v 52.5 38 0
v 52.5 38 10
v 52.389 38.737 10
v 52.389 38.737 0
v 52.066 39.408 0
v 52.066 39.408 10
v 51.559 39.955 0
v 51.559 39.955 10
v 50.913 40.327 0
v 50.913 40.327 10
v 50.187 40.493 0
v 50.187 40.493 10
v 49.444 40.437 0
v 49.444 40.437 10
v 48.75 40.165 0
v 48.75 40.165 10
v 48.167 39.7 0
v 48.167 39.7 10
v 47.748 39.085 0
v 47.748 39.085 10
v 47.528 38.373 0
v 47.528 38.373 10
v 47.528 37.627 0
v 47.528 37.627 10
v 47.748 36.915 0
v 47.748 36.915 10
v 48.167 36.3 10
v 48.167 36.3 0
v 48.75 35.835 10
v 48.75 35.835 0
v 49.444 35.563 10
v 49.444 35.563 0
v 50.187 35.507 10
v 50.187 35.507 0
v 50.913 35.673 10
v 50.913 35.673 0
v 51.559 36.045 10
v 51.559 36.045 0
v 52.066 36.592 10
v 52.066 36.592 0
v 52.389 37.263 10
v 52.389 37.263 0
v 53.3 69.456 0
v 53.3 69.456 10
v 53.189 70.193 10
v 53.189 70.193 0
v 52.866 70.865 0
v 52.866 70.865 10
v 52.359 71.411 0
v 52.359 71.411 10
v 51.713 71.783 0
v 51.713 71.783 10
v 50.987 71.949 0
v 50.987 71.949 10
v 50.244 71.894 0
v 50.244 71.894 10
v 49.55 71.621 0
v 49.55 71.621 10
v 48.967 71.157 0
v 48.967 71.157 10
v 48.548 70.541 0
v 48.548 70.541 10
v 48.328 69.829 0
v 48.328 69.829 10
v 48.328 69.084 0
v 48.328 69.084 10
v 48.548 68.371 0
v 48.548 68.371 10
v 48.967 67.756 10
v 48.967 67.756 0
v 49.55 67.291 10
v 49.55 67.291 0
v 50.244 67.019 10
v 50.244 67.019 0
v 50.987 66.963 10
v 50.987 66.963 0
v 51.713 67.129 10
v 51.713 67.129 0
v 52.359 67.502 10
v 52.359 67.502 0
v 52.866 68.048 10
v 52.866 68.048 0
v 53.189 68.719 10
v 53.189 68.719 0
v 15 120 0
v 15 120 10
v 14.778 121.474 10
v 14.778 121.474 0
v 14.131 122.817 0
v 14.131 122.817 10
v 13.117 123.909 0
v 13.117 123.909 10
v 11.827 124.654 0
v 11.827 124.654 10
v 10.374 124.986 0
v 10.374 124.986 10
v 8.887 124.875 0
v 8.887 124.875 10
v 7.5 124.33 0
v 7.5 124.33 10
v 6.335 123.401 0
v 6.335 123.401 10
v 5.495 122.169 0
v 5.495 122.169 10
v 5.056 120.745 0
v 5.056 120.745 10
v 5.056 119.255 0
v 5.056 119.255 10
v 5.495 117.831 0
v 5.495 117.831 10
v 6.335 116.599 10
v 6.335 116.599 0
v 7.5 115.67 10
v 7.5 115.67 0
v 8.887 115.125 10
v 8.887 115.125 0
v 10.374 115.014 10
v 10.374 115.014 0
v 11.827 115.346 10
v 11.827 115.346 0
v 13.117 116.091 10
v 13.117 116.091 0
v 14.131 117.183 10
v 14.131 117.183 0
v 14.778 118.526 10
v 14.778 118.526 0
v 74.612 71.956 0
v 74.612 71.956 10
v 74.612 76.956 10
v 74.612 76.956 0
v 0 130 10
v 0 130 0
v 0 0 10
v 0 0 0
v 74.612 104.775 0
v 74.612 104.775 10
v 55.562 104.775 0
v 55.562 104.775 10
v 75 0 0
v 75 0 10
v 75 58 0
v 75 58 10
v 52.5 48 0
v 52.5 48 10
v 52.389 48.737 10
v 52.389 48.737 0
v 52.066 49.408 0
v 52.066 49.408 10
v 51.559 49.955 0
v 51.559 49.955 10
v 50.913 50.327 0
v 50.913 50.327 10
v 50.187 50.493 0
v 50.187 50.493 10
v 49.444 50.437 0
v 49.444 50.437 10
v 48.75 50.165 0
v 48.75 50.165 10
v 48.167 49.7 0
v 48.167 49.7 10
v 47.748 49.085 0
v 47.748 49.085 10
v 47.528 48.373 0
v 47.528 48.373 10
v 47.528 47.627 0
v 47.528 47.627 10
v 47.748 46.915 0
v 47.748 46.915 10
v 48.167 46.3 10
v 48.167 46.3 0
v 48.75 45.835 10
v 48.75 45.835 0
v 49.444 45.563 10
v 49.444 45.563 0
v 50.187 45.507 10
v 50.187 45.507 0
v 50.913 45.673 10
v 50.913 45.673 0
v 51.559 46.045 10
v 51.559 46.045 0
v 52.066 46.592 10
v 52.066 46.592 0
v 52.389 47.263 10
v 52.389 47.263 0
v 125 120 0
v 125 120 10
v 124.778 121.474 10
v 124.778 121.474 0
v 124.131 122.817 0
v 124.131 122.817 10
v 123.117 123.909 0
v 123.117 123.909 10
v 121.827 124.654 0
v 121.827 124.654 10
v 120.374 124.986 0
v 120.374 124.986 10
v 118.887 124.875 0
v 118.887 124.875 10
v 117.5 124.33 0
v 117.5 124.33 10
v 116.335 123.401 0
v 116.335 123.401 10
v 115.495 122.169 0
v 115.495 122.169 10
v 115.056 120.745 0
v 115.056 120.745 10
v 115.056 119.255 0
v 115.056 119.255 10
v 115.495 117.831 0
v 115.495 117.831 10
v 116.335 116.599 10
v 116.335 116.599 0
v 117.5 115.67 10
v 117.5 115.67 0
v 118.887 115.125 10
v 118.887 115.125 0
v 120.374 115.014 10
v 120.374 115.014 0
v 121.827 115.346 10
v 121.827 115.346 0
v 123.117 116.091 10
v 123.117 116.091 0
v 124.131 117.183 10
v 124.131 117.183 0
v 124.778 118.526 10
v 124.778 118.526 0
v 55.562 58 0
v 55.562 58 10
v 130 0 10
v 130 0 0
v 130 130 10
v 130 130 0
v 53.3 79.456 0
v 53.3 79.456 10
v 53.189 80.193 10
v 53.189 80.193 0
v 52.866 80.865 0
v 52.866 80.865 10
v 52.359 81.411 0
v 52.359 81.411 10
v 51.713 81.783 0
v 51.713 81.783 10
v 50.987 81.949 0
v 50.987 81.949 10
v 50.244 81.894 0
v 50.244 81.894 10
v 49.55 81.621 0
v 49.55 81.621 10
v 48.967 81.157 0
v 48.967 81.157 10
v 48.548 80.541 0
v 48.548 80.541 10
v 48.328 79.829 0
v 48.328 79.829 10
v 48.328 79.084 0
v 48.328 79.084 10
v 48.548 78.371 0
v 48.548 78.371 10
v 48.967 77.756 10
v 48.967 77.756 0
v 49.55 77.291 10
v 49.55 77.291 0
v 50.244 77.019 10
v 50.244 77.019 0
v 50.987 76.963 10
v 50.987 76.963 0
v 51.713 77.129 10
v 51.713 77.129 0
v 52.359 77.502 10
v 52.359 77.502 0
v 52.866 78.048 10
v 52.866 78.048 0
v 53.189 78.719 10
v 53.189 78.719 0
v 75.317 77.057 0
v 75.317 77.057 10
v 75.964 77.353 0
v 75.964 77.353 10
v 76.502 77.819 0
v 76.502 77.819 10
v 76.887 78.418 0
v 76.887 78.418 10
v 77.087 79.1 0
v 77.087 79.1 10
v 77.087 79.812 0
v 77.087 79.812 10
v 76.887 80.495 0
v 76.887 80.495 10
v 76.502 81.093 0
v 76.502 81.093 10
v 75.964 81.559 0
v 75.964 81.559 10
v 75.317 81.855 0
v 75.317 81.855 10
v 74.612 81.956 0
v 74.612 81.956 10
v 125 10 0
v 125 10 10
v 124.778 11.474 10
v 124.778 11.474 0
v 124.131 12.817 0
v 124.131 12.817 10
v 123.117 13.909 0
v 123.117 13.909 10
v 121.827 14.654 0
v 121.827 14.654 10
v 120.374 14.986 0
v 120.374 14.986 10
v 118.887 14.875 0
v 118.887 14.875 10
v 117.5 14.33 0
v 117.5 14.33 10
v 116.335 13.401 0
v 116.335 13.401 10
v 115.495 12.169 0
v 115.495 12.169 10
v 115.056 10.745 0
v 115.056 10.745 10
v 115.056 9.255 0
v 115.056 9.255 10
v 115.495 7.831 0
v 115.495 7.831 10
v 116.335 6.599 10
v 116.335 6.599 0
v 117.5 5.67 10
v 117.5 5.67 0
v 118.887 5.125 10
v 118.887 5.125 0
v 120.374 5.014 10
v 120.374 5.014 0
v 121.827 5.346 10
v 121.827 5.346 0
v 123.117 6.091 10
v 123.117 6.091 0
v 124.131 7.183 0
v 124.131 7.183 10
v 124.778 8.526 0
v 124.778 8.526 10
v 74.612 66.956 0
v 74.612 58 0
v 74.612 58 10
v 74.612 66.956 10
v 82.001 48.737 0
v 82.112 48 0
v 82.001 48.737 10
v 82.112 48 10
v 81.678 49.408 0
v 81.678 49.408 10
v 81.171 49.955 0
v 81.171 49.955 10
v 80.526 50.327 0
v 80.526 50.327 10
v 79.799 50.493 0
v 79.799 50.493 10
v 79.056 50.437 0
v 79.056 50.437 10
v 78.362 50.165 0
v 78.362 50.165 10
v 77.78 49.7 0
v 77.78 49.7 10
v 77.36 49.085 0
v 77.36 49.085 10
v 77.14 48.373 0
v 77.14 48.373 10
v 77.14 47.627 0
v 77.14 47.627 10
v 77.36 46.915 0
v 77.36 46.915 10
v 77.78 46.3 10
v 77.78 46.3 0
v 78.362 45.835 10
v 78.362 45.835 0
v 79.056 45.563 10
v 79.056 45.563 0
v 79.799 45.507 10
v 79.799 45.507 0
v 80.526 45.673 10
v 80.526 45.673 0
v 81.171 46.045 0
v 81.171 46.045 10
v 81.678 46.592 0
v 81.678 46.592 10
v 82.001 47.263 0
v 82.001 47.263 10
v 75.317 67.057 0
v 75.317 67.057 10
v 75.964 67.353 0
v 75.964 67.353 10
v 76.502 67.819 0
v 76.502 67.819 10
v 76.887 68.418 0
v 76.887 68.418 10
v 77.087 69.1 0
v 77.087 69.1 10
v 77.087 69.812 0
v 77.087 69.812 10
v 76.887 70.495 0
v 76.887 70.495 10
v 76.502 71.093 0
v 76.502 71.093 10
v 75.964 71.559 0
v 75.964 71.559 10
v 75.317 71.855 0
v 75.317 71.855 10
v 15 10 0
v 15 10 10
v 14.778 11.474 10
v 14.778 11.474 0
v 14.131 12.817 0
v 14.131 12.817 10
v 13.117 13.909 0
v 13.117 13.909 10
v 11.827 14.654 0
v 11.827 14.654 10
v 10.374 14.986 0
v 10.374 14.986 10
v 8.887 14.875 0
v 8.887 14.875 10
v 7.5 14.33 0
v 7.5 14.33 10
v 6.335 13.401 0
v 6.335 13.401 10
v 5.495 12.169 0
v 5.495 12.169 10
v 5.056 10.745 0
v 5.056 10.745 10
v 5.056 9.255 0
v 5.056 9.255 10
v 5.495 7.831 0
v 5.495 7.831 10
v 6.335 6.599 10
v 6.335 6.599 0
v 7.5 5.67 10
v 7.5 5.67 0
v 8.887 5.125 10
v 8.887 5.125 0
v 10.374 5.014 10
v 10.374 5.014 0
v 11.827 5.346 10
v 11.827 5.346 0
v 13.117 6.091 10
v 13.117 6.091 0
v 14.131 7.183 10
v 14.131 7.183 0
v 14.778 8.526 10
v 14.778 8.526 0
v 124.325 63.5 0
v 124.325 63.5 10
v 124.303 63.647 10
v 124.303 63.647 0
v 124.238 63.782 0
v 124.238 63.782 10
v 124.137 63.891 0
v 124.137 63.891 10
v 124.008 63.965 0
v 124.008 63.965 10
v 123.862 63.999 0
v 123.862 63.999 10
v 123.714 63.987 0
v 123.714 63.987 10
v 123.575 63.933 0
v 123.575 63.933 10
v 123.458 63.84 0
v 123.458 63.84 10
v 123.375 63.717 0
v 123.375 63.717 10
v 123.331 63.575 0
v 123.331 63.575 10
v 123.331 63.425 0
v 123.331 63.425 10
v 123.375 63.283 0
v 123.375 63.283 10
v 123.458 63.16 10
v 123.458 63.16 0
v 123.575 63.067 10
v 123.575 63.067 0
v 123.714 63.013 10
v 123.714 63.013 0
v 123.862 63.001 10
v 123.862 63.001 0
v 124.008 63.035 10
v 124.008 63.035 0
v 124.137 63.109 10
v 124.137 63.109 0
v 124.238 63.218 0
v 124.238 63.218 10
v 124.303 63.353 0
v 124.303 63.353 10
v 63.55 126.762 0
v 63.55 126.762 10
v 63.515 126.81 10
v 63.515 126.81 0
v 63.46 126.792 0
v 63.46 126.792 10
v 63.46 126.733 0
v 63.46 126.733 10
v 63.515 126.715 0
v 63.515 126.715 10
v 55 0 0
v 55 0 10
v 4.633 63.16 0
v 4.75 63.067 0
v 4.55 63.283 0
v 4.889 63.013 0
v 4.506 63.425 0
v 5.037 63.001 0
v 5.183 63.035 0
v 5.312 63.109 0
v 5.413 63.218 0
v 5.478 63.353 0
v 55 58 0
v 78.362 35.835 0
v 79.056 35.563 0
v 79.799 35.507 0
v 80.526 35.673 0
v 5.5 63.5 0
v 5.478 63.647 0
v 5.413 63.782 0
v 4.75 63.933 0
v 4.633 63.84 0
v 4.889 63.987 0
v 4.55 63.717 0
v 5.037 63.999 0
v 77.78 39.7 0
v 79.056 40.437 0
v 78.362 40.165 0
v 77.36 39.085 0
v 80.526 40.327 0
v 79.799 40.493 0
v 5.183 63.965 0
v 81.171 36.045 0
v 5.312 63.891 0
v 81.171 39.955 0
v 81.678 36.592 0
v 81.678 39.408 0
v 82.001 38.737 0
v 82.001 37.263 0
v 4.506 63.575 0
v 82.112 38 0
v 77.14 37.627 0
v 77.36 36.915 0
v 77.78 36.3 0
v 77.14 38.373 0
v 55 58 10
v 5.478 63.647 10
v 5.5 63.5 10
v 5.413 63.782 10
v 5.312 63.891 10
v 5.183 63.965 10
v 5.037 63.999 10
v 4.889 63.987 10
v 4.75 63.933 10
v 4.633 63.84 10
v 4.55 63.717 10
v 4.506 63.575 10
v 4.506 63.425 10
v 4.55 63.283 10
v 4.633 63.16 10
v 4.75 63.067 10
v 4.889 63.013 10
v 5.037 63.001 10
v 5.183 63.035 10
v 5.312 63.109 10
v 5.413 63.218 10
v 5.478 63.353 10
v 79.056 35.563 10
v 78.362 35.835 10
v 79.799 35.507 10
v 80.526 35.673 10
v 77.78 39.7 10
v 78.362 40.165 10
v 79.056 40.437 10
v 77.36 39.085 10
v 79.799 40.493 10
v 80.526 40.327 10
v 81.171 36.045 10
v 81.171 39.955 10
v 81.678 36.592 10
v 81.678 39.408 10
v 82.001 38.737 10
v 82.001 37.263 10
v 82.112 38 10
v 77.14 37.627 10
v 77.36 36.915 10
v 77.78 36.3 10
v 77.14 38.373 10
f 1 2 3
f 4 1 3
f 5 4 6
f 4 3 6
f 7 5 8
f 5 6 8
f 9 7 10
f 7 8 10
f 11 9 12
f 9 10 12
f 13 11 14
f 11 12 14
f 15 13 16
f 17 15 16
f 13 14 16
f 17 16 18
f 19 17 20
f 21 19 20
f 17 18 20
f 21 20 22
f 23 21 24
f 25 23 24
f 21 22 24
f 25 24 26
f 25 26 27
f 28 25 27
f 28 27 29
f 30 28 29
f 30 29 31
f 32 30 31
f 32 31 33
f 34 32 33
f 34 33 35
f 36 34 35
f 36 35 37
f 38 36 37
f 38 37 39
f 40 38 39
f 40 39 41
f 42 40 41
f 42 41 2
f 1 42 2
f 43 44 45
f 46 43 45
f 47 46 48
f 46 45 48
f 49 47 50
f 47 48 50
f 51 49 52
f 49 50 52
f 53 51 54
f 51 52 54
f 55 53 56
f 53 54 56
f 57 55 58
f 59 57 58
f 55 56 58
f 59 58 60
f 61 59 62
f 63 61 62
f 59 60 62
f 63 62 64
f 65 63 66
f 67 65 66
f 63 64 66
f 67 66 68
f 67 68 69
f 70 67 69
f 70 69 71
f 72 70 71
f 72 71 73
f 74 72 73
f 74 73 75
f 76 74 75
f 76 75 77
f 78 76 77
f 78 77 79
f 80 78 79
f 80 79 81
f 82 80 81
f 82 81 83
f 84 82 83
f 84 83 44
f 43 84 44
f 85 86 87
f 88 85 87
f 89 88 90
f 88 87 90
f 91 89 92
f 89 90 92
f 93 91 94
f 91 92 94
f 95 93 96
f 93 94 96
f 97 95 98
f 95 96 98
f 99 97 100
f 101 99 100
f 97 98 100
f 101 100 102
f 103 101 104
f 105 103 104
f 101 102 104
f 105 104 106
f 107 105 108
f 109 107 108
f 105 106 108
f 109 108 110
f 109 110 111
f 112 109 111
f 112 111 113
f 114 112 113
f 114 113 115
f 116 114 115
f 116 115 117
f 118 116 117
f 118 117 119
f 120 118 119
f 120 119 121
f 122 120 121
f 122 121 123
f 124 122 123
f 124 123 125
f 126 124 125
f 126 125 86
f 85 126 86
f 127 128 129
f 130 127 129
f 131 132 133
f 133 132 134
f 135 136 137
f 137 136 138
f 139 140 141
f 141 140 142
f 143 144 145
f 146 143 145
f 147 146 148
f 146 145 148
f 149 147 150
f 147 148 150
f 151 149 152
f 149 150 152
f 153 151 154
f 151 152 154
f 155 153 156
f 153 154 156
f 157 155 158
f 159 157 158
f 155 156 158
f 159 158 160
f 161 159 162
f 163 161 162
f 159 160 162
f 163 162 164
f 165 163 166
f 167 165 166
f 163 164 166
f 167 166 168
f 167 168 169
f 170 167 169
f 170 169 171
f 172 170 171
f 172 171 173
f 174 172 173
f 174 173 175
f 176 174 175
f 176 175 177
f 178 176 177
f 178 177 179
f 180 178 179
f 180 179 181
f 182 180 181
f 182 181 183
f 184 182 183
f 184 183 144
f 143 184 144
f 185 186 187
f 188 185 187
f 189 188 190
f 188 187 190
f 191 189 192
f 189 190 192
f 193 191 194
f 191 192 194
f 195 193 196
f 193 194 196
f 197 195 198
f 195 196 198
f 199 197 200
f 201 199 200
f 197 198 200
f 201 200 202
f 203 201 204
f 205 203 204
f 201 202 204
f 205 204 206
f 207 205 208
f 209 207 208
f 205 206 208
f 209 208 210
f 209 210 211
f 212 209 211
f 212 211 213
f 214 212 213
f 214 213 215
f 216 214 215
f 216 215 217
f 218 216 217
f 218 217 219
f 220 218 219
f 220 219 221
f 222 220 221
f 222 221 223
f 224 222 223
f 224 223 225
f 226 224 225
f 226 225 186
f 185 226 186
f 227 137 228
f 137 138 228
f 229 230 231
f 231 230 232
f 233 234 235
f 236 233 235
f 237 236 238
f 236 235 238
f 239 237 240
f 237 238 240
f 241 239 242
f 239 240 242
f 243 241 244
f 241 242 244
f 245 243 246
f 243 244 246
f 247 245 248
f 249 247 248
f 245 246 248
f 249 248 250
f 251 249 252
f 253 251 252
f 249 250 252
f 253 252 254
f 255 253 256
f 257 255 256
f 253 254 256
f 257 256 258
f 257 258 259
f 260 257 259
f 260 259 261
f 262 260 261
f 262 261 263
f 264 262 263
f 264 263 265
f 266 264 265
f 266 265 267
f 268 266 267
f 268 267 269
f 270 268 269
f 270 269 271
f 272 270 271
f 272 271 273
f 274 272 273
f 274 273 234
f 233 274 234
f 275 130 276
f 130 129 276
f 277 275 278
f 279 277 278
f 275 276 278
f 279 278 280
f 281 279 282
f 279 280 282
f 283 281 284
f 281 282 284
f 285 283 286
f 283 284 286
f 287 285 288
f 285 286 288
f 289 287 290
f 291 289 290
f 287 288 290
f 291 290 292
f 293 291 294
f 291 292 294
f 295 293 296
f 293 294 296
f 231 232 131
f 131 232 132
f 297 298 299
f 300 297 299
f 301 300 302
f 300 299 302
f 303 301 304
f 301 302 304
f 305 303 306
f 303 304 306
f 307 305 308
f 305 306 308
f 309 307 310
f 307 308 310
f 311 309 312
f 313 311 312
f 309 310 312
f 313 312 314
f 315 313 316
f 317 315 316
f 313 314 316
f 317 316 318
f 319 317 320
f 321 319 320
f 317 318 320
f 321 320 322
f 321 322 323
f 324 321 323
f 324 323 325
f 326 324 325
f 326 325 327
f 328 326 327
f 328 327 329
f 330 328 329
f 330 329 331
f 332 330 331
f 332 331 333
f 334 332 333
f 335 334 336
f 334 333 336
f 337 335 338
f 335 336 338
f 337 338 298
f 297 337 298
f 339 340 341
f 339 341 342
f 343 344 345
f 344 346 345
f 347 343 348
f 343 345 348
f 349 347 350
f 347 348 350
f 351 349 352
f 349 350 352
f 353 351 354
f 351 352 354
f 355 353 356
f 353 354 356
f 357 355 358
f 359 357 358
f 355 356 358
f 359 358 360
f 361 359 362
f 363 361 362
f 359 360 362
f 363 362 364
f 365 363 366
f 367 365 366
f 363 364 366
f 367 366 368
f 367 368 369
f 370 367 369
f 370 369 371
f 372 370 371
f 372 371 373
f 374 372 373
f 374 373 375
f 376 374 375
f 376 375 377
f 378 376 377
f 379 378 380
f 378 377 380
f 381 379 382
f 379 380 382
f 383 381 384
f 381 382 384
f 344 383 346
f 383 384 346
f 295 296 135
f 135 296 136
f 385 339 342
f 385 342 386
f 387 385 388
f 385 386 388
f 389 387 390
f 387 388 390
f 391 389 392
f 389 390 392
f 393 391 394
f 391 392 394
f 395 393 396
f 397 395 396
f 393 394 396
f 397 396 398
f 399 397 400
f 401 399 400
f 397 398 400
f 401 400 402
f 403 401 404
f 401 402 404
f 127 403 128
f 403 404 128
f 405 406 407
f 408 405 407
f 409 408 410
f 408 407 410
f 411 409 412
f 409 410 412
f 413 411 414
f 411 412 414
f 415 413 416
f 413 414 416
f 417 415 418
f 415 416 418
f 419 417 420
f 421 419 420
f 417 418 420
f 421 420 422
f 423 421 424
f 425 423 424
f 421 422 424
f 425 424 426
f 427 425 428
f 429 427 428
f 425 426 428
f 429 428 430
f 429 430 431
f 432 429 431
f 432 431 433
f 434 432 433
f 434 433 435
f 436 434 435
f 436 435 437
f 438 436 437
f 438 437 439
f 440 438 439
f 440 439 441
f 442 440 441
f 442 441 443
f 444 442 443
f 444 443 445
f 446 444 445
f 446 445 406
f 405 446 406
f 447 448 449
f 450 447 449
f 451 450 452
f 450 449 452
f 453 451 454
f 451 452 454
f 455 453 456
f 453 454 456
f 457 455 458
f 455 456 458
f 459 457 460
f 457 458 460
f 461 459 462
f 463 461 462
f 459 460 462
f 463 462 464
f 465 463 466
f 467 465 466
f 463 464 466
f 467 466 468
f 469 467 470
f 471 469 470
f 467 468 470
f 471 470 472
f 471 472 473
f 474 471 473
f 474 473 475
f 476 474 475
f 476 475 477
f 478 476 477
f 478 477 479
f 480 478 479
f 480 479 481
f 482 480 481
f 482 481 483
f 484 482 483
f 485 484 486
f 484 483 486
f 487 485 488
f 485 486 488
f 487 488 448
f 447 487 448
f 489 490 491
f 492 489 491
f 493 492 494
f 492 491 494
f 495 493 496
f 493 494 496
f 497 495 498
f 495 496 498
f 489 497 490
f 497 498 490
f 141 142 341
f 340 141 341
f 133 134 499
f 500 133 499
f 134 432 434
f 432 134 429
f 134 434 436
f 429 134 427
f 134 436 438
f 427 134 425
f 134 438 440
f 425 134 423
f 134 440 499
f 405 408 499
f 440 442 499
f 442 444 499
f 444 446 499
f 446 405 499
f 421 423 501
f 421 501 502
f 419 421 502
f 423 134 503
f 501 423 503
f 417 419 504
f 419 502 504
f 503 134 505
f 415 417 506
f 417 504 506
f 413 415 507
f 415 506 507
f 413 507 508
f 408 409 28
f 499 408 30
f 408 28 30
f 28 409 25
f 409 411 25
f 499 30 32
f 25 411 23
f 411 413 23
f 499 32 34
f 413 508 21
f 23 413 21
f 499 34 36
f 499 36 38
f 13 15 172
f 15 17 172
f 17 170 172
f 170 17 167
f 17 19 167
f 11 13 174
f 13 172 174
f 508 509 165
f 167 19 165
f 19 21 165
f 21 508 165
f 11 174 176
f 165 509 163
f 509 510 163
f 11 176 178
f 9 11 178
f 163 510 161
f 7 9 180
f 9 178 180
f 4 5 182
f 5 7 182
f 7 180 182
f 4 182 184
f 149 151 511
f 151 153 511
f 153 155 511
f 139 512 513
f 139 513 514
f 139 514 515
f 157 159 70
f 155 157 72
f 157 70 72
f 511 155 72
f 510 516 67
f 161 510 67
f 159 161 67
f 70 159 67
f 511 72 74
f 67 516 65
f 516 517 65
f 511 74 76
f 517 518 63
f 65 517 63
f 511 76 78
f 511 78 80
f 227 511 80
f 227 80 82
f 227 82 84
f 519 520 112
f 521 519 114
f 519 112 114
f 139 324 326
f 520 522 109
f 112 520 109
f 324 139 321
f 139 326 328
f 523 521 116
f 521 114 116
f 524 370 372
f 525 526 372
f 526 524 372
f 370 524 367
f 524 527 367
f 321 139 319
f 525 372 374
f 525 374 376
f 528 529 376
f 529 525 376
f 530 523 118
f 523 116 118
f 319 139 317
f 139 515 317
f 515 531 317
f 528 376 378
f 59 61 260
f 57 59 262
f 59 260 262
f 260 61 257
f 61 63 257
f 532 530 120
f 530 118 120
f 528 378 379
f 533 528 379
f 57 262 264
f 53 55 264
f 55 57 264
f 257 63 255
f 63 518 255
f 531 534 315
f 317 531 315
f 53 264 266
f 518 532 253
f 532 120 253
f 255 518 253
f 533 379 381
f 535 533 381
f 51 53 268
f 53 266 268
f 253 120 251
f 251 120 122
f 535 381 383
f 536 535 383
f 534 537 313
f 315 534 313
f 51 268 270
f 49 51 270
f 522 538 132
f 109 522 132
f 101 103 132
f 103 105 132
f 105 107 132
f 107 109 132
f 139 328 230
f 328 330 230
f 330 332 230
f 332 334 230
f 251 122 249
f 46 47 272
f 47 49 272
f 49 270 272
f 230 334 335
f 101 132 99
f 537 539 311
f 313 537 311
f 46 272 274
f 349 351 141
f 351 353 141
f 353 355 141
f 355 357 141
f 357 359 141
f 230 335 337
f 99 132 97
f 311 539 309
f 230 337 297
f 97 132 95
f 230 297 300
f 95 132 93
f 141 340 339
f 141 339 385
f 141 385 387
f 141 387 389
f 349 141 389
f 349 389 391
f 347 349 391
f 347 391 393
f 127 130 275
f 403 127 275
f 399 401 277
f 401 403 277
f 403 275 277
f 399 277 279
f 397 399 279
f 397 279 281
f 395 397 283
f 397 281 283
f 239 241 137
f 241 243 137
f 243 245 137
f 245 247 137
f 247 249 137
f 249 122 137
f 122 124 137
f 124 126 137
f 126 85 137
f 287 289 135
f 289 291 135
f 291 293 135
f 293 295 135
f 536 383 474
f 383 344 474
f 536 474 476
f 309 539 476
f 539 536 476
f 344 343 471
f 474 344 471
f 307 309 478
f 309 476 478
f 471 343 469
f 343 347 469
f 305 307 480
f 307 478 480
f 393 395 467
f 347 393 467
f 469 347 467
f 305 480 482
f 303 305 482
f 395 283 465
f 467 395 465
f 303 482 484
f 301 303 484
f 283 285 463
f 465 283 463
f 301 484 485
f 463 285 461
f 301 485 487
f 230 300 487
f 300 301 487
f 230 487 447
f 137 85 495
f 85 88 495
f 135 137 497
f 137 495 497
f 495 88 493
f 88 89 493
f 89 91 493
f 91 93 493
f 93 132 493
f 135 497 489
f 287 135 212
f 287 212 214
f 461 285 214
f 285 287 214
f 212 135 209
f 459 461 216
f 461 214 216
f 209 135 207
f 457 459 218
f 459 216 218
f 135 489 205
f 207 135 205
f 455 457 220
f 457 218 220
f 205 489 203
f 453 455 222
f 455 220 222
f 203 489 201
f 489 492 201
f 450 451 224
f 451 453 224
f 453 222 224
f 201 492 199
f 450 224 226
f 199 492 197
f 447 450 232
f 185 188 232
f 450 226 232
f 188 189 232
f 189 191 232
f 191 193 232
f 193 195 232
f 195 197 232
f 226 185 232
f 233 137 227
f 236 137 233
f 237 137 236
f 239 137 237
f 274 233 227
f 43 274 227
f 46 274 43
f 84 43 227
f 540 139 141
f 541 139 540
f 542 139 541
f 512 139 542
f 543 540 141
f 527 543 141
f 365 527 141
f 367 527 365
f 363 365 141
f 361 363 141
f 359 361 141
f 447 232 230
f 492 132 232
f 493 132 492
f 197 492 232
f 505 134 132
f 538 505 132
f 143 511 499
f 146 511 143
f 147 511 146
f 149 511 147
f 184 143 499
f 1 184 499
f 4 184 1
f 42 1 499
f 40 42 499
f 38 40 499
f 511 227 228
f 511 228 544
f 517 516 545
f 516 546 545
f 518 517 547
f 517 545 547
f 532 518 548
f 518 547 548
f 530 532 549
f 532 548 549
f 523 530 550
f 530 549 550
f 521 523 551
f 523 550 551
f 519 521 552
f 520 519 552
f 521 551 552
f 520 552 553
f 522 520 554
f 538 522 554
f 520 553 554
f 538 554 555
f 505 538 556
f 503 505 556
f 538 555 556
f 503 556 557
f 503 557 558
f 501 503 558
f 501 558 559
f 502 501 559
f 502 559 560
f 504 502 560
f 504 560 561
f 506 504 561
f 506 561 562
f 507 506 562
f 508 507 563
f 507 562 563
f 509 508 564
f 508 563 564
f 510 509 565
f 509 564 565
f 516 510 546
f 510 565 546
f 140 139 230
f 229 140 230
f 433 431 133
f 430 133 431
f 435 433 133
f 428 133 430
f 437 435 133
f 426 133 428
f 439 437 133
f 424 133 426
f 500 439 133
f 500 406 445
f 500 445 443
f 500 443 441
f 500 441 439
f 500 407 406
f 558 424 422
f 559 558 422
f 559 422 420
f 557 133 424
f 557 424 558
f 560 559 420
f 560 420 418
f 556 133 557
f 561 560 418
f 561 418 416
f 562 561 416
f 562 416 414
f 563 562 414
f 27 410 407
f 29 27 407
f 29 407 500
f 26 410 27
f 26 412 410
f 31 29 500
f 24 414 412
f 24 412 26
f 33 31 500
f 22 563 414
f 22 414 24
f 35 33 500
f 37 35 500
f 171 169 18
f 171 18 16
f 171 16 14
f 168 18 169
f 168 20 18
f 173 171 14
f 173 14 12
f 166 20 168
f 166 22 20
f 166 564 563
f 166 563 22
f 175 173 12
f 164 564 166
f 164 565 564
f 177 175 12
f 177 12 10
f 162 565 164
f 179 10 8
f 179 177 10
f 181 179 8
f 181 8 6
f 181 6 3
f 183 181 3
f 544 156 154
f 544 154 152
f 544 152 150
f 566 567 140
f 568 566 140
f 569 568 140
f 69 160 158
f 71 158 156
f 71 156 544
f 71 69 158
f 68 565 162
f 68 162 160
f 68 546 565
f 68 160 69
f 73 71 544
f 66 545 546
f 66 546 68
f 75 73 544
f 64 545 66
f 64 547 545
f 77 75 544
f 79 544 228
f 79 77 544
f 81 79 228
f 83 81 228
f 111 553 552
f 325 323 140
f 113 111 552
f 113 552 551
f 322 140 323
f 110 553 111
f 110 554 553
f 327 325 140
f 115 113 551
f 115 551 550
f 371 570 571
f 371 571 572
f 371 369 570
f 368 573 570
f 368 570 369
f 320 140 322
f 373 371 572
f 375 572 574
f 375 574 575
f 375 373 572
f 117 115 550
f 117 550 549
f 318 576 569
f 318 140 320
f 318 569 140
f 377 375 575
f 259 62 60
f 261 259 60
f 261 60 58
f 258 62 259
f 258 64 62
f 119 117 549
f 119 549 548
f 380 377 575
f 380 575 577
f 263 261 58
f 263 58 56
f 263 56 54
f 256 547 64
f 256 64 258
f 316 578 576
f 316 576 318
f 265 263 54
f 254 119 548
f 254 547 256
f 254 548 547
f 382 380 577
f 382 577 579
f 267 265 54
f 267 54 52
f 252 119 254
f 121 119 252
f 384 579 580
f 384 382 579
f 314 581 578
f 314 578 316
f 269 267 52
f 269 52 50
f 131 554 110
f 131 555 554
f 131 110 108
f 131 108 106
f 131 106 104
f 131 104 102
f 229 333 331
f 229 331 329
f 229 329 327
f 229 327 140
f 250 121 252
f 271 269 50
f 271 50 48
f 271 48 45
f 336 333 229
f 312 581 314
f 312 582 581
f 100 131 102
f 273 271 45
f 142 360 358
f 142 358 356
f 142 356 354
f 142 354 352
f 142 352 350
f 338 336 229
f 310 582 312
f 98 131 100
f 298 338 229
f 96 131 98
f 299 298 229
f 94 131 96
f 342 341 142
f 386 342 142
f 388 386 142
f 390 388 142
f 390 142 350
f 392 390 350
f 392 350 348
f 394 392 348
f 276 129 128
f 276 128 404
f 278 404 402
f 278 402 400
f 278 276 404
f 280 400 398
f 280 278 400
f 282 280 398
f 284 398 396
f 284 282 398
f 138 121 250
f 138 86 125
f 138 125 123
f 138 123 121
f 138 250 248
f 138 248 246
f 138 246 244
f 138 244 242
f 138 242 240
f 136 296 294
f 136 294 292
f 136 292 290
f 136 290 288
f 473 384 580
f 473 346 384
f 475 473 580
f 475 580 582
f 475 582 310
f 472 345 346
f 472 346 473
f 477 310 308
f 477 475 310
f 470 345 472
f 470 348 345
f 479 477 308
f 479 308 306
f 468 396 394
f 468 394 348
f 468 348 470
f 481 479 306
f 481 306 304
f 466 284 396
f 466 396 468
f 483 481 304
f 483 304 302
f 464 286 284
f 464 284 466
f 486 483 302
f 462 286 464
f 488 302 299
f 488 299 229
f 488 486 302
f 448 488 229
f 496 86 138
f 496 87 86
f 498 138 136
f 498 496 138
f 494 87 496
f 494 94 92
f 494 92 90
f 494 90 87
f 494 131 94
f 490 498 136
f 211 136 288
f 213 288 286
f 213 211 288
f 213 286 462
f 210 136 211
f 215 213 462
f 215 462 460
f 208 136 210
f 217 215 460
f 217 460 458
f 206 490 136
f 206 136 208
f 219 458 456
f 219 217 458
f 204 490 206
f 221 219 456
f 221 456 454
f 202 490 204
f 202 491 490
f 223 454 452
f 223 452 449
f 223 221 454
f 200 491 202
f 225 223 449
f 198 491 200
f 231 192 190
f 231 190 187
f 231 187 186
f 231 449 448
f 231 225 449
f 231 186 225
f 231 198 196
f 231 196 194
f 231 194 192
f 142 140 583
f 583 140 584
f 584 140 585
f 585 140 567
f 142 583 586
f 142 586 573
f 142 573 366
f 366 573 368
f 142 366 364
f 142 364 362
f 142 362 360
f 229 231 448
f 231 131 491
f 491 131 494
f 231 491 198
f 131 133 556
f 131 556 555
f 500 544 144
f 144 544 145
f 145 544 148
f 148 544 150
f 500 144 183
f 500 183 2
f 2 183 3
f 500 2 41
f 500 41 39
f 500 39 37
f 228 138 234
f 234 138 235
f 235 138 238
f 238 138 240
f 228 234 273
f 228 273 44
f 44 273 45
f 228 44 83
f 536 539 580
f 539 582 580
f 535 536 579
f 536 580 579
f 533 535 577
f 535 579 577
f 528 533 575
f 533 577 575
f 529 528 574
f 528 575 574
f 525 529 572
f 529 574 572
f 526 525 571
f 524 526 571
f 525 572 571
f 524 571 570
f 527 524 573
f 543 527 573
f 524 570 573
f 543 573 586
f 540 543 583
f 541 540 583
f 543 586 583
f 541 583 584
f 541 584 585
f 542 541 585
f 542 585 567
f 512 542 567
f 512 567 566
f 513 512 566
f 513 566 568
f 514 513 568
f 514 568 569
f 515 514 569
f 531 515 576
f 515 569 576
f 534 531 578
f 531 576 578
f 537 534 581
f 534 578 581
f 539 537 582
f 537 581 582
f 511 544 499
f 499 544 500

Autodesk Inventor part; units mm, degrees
ref_plane "YZ Plane" through (0, 0, 0) normal (1, 0, 0) x (0, 1, 0)
ref_plane "XZ Plane" through (0, 0, 0) normal (0, 1, 0) x (-1, 0, 0)
ref_plane "XY Plane" through (0, 0, 0) normal (0, 0, 1) x (1, 0, 0)
sketch "Sketch1" plane through (0, 0, 0) normal (0, 0, 1) x (1, 0, 0)
  line L0 (0, 0) -> (130, 0)
  line L1 (130, 0) -> (130, 130)
  line L2 (130, 130) -> (0, 130)
  line L3 (0, 130) -> (0, 0)
  dimension "d0" = 130
  dimension "d1" = 130
extrude "Extrusion1" add sketch "Sketch1" along normal blind 10
sketch "Sketch2" plane through (0, 0, 10) normal (0, 0, 1) x (1, 0, 0)
  line L0 (0, 0) -> (130, 0) projected
  line L1 (0, 0) -> (10, 0)
  line L2 (10, 0) -> (10, 110)
  line L3 (10, 110) -> (10, 120)
  line L4 (10, 120) -> (120, 120)
  line L5 (120, 120) -> (120, 10)
  line L6 (120, 10) -> (10, 10)
  circle A0 centre (10, 120) radius 5
  circle A1 centre (120, 120) radius 5
  circle A2 centre (10, 10) radius 5
  circle A3 centre (120, 10) radius 5
  dimension "d4" = 10
  dimension "d5" = 110
  dimension "d6" = 10
  dimension "d7" = 110
  dimension "d8" = 110
  dimension "d9" = 110
  dimension "d10" = 10
  dimension "d11" = 10
  dimension "d12" = 10
  dimension "d13" = 10
extrude "Extrusion2" cut sketch "Sketch2" against normal through all contours A2 L2 | L2 L6 A2 | L2 A2 L6 | A3 L5 L6 | L6 L5 A3 | A0 L4 L3 | L3 L4 A0 | A1 L4 L5 | L5 L4 A1
sketch "Sketch3" plane through (0, 0, 10) normal (0, 0, 1) x (1, 0, 0)
  line L0 (0, 0) -> (130, 0) projected
  line L1 (68.2625, 0) -> (63.2625, 0)
  line L2 (63.2625, 0) -> (63.2625, 5)
  circle A0 centre (63.2625, 5) radius 0.05
  dimension "d16" = 5
  dimension "d17" = 5
  dimension "d18" = 0.1
extrude "Extrusion3" cut sketch "Sketch3" along normal through all both and the other way through all
sketch "Sketch4" plane through (0, 0, 10) normal (0, 0, 1) x (1, 0, 0)
  line L0 (63.5, 131.7625) -> (63.5, 126.7625)
  circle A0 centre (63.5, 126.7625) radius 0.05
  point P0 (0, 0)
  dimension "d21" = 5
  dimension "d22" = 0.1
extrude "Extrusion4" cut sketch "Sketch4" against normal blind 10
sketch "Sketch5" plane through (0, 0, 10) normal (0, 0, 1) x (1, 0, 0)
  line L0 (0, 63.5) -> (5, 63.5)
  line L1 (5, 63.5) -> (123.825, 63.5)
  circle A0 centre (5, 63.5) radius 0.5
  circle A1 centre (123.825, 63.5) radius 0.5
  point P0 (0, 0)
  dimension "d25" = 5
  dimension "d26" = 1
  dimension "d27" = 1
extrude "Extrusion5" cut sketch "Sketch5" against normal through all
sketch "Sketch6" plane through (0, 0, 10) normal (0, 0, 1) x (1, 0, 0)
  point P0 (0, 0)
sketch "Sketch7" plane through (0, 0, 10) normal (0, 0, 1) x (1, 0, 0)
  line L0 (0, 0) -> (55, 0)
  line L1 (0, 0) -> (130, 0) projected
  line L2 (55, 0) -> (75, 0)
  line L3 (75, 0) -> (130, 0)
  line L4 (55, 0) -> (75, 0)
  line L5 (75, 0) -> (75, 58)
  line L6 (75, 58) -> (55, 58)
  line L7 (55, 58) -> (55, 0)
  dimension "d30" = 55
  dimension "d31" = 20
  dimension "d32" = 55
  dimension "d33" = 20
  dimension "d34" = 58
extrude "Extrusion6" cut sketch "Sketch7" against normal blind 10
sketch "Sketch8" plane through (0, 0, 10) normal (0, 0, 1) x (1, 0, 0)
  line L0 (74.6125, 0) -> (79.6125, 0)
  line L1 (79.6125, 0) -> (79.6125, 38)
  line L2 (79.6125, 38) -> (79.6125, 48)
  line L3 (55, 58) -> (55, 0) projected
  line L4 (55, 0) -> (50, 0)
  line L5 (0, 0) -> (55, 0) projected
  line L6 (50, 0) -> (50, 38)
  line L7 (50, 38) -> (50, 48)
  circle A0 centre (79.6125, 48) radius 2.5
  circle A1 centre (79.6125, 38) radius 2.5
  circle A2 centre (50, 48) radius 2.5
  circle A3 centre (50, 38) radius 2.5
  dimension "d37" = 5
  dimension "d38" = 38
  dimension "d39" = 10
  dimension "d40" = 5
  dimension "d41" = 38
  dimension "d42" = 10
  dimension "d43" = 5
  dimension "d44" = 5
  dimension "d45" = 5
  dimension "d46" = 5
extrude "Extrusion7" cut sketch "Sketch8" against normal through all
sketch "Sketch9" plane through (0, 0, 10) normal (0, 0, 1) x (1, 0, 0)
  line L0 (55.5625, 57.15) -> (74.6125, 57.15)
  line L1 (74.6125, 57.15) -> (74.6125, 104.775)
  line L2 (74.6125, 104.775) -> (55.5625, 104.775)
  line L3 (55.5625, 104.775) -> (55.5625, 57.15)
  point P0 (0, 0)
extrude "Extrusion8" cut sketch "Sketch9" against normal blind 10
sketch "Sketch10" plane through (0, 0, 10) normal (0, 0, 1) x (1, 0, 0)
  line L0 (0, 0) -> (55, 0) projected
  line L1 (55, 0) -> (55, 5)
  line L2 (55, 0) -> (42.8625, 0)
  dimension "d51" = 5
sketch "Sketch11" plane through (0, 0, 10) normal (0, 0, 1) x (1, 0, 0)
  line L0 (55.5625, 0) -> (50.5625, 0)
  line L1 (0, 0) -> (55, 0) projected
  dimension "d52" = 5
sketch "Sketch12" plane through (0, 0, 10) normal (0, 0, 1) x (1, 0, 0)
  line L0 (75, 58) -> (75, 0) projected
  line L1 (75, 0) -> (80, 0)
  line L2 (75, 0) -> (130, 0) projected
  line L3 (80, 0) -> (80, 85.725)
  line L4 (80, 85.725) -> (80, 100.0125)
  line L5 (50.8, 0) -> (50.8, 69.4562)
  line L6 (55, 0) -> (55, 58) projected
  line L7 (50.8, 69.4562) -> (50.8, 79.4562)
  line L8 (50.8, 79.4562) -> (80, 79.4562)
  circle A0 centre (50.8, 79.4562) radius 2.5
  circle A1 centre (50.8, 69.4562) radius 2.5
  line L9 (50.8, 69.4562) -> (80, 69.4562)
  line L10 (80, 79.4562) -> (82.5, 79.4562)
  line L11 (82.5, 79.4562) -> (77.5, 79.4562)
  line L12 (77.5, 79.4562) -> (77.5, 69.4562)
  circle A2 centre (74.6125, 79.4562) radius 2.5
  circle A3 centre (74.6125, 69.4562) radius 2.5
  point P0 (0, 0)
  dimension "d53" = 5
  dimension "d54" = 10
  dimension "d55" = 5
  dimension "d56" = 5
  dimension "d61" = 2.5
  dimension "d62" = 5
  dimension "d64" = 5
  dimension "d65" = 5
extrude "Extrusion9" cut sketch "Sketch12" against normal blind 10 contours A3 L9 | L9 A3 | A2 L8 | L8 A2 | L9 L7 A1 | A1 L5 L9 | A0 L7 L8 | L8 L7 A0 | L7 L5 A1
properties part number "top STAND PLATE FOR STORSGE SYSTEM"
